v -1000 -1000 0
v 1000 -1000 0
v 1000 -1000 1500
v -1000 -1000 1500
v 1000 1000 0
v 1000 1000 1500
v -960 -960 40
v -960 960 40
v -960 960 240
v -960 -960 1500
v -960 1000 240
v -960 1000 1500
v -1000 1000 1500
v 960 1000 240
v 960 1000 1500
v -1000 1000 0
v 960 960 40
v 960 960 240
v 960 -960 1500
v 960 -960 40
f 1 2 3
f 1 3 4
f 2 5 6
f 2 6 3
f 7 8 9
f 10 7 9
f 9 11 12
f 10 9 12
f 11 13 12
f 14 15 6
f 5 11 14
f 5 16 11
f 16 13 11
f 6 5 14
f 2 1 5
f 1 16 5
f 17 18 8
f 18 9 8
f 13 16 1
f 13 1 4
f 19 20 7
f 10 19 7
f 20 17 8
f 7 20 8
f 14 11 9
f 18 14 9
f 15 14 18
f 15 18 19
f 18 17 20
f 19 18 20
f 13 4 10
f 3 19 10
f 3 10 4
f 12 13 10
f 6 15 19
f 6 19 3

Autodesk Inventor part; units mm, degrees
ref_plane "YZ Plane" through (0, 0, 0) normal (1, 0, 0) x (0, 1, 0)
ref_plane "XZ Plane" through (0, 0, 0) normal (0, 1, 0) x (-1, 0, 0)
ref_plane "XY Plane" through (0, 0, 0) normal (0, 0, 1) x (1, 0, 0)
sketch "Esquisse2" plane through (0, 0, 0) normal (0, 0, 1) x (1, 0, 0)
  line L0 (-1000, 1000) -> (1000, 1000)
  line L1 (1000, 1000) -> (1000, -1000)
  line L2 (1000, -1000) -> (-1000, -1000)
  line L3 (-1000, -1000) -> (-1000, 1000)
  line L4 (0, 1400) -> (0, -1400) construction
  line L5 (-1400, 0) -> (1400, 0) construction
  point P0 (0, 0)
  dimension "d0" = 2000
  dimension "d1" = 2000
  dimension "d2" = 1000
  dimension "d3" = 1000
extrude "Extrusion1" add sketch "Esquisse2" along normal blind 1500
sketch "Esquisse3" plane through (-1000, 1000, 0) normal (0, 1, 0) x (1, 0, 0)
  line L0 (2000, 0) -> (0, 0) construction
  line L1 (0, 0) -> (0, -1500) construction
  line L2 (2000, -1500) -> (0, -1500) construction
  line L3 (2000, 0) -> (2000, -1500) construction
  line L4 (40, -1460) -> (1960, -1460)
  line L5 (1960, -1460) -> (1960, -40)
  line L6 (1960, -40) -> (40, -40)
  line L7 (40, -40) -> (40, -1460)
  point P0 (1000, 0)
  dimension "d6" = 1920
  dimension "d8" = 40
  dimension "d9" = 40
  dimension "d21" = 40
extrude "Extrusion2" cut sketch "Esquisse3" against normal blind 1960
sketch "Esquisse5" plane through (960, 1000, 1460) normal (0, 0, -1) x (-1, 0, 0)
  line L0 (0, 0) -> (1920, 0) construction
  line L1 (0, 0) -> (0, -1960) construction
  line L2 (0, -1960) -> (1920, -1960) construction
  line L3 (1920, 0) -> (1920, -1960) construction
  line L4 (0, -1960) -> (1920, -1960) construction
  line L5 (1920, 0) -> (0, 0)
  line L6 (0, 0) -> (0, -1960)
  line L7 (0, -1960) -> (1920, -1960)
  line L8 (1920, -1960) -> (1920, 0)
  point P0 (960, -1000)
extrude "Extrusion4" cut sketch "Esquisse5" against normal blind 40
sketch "Esquisse7" plane through (-1000, -1000, 0) normal (-1, 0, 0) x (0, 0, 1)
  line L0 (40, 2000) -> (40, 40) construction
  line L1 (0, 2000) -> (0, 0) construction
  line L2 (0, 0) -> (1500, 0) construction
  line L3 (1500, 2000) -> (1500, 0) construction
  line L4 (0, 2000) -> (1500, 2000) construction
  line L5 (40, 2000) -> (240, 2000)
  line L6 (240, 2000) -> (240, 1960)
  line L7 (240, 1960) -> (40, 1960)
  line L8 (40, 1960) -> (40, 2000)
  point P0 (0, 1000)
  dimension "d22" = 200
  dimension "d23" = 40
extrude "Extrusion6" add sketch "Esquisse7" against normal blind 2000
properties part number "P001_CageDeTest"
